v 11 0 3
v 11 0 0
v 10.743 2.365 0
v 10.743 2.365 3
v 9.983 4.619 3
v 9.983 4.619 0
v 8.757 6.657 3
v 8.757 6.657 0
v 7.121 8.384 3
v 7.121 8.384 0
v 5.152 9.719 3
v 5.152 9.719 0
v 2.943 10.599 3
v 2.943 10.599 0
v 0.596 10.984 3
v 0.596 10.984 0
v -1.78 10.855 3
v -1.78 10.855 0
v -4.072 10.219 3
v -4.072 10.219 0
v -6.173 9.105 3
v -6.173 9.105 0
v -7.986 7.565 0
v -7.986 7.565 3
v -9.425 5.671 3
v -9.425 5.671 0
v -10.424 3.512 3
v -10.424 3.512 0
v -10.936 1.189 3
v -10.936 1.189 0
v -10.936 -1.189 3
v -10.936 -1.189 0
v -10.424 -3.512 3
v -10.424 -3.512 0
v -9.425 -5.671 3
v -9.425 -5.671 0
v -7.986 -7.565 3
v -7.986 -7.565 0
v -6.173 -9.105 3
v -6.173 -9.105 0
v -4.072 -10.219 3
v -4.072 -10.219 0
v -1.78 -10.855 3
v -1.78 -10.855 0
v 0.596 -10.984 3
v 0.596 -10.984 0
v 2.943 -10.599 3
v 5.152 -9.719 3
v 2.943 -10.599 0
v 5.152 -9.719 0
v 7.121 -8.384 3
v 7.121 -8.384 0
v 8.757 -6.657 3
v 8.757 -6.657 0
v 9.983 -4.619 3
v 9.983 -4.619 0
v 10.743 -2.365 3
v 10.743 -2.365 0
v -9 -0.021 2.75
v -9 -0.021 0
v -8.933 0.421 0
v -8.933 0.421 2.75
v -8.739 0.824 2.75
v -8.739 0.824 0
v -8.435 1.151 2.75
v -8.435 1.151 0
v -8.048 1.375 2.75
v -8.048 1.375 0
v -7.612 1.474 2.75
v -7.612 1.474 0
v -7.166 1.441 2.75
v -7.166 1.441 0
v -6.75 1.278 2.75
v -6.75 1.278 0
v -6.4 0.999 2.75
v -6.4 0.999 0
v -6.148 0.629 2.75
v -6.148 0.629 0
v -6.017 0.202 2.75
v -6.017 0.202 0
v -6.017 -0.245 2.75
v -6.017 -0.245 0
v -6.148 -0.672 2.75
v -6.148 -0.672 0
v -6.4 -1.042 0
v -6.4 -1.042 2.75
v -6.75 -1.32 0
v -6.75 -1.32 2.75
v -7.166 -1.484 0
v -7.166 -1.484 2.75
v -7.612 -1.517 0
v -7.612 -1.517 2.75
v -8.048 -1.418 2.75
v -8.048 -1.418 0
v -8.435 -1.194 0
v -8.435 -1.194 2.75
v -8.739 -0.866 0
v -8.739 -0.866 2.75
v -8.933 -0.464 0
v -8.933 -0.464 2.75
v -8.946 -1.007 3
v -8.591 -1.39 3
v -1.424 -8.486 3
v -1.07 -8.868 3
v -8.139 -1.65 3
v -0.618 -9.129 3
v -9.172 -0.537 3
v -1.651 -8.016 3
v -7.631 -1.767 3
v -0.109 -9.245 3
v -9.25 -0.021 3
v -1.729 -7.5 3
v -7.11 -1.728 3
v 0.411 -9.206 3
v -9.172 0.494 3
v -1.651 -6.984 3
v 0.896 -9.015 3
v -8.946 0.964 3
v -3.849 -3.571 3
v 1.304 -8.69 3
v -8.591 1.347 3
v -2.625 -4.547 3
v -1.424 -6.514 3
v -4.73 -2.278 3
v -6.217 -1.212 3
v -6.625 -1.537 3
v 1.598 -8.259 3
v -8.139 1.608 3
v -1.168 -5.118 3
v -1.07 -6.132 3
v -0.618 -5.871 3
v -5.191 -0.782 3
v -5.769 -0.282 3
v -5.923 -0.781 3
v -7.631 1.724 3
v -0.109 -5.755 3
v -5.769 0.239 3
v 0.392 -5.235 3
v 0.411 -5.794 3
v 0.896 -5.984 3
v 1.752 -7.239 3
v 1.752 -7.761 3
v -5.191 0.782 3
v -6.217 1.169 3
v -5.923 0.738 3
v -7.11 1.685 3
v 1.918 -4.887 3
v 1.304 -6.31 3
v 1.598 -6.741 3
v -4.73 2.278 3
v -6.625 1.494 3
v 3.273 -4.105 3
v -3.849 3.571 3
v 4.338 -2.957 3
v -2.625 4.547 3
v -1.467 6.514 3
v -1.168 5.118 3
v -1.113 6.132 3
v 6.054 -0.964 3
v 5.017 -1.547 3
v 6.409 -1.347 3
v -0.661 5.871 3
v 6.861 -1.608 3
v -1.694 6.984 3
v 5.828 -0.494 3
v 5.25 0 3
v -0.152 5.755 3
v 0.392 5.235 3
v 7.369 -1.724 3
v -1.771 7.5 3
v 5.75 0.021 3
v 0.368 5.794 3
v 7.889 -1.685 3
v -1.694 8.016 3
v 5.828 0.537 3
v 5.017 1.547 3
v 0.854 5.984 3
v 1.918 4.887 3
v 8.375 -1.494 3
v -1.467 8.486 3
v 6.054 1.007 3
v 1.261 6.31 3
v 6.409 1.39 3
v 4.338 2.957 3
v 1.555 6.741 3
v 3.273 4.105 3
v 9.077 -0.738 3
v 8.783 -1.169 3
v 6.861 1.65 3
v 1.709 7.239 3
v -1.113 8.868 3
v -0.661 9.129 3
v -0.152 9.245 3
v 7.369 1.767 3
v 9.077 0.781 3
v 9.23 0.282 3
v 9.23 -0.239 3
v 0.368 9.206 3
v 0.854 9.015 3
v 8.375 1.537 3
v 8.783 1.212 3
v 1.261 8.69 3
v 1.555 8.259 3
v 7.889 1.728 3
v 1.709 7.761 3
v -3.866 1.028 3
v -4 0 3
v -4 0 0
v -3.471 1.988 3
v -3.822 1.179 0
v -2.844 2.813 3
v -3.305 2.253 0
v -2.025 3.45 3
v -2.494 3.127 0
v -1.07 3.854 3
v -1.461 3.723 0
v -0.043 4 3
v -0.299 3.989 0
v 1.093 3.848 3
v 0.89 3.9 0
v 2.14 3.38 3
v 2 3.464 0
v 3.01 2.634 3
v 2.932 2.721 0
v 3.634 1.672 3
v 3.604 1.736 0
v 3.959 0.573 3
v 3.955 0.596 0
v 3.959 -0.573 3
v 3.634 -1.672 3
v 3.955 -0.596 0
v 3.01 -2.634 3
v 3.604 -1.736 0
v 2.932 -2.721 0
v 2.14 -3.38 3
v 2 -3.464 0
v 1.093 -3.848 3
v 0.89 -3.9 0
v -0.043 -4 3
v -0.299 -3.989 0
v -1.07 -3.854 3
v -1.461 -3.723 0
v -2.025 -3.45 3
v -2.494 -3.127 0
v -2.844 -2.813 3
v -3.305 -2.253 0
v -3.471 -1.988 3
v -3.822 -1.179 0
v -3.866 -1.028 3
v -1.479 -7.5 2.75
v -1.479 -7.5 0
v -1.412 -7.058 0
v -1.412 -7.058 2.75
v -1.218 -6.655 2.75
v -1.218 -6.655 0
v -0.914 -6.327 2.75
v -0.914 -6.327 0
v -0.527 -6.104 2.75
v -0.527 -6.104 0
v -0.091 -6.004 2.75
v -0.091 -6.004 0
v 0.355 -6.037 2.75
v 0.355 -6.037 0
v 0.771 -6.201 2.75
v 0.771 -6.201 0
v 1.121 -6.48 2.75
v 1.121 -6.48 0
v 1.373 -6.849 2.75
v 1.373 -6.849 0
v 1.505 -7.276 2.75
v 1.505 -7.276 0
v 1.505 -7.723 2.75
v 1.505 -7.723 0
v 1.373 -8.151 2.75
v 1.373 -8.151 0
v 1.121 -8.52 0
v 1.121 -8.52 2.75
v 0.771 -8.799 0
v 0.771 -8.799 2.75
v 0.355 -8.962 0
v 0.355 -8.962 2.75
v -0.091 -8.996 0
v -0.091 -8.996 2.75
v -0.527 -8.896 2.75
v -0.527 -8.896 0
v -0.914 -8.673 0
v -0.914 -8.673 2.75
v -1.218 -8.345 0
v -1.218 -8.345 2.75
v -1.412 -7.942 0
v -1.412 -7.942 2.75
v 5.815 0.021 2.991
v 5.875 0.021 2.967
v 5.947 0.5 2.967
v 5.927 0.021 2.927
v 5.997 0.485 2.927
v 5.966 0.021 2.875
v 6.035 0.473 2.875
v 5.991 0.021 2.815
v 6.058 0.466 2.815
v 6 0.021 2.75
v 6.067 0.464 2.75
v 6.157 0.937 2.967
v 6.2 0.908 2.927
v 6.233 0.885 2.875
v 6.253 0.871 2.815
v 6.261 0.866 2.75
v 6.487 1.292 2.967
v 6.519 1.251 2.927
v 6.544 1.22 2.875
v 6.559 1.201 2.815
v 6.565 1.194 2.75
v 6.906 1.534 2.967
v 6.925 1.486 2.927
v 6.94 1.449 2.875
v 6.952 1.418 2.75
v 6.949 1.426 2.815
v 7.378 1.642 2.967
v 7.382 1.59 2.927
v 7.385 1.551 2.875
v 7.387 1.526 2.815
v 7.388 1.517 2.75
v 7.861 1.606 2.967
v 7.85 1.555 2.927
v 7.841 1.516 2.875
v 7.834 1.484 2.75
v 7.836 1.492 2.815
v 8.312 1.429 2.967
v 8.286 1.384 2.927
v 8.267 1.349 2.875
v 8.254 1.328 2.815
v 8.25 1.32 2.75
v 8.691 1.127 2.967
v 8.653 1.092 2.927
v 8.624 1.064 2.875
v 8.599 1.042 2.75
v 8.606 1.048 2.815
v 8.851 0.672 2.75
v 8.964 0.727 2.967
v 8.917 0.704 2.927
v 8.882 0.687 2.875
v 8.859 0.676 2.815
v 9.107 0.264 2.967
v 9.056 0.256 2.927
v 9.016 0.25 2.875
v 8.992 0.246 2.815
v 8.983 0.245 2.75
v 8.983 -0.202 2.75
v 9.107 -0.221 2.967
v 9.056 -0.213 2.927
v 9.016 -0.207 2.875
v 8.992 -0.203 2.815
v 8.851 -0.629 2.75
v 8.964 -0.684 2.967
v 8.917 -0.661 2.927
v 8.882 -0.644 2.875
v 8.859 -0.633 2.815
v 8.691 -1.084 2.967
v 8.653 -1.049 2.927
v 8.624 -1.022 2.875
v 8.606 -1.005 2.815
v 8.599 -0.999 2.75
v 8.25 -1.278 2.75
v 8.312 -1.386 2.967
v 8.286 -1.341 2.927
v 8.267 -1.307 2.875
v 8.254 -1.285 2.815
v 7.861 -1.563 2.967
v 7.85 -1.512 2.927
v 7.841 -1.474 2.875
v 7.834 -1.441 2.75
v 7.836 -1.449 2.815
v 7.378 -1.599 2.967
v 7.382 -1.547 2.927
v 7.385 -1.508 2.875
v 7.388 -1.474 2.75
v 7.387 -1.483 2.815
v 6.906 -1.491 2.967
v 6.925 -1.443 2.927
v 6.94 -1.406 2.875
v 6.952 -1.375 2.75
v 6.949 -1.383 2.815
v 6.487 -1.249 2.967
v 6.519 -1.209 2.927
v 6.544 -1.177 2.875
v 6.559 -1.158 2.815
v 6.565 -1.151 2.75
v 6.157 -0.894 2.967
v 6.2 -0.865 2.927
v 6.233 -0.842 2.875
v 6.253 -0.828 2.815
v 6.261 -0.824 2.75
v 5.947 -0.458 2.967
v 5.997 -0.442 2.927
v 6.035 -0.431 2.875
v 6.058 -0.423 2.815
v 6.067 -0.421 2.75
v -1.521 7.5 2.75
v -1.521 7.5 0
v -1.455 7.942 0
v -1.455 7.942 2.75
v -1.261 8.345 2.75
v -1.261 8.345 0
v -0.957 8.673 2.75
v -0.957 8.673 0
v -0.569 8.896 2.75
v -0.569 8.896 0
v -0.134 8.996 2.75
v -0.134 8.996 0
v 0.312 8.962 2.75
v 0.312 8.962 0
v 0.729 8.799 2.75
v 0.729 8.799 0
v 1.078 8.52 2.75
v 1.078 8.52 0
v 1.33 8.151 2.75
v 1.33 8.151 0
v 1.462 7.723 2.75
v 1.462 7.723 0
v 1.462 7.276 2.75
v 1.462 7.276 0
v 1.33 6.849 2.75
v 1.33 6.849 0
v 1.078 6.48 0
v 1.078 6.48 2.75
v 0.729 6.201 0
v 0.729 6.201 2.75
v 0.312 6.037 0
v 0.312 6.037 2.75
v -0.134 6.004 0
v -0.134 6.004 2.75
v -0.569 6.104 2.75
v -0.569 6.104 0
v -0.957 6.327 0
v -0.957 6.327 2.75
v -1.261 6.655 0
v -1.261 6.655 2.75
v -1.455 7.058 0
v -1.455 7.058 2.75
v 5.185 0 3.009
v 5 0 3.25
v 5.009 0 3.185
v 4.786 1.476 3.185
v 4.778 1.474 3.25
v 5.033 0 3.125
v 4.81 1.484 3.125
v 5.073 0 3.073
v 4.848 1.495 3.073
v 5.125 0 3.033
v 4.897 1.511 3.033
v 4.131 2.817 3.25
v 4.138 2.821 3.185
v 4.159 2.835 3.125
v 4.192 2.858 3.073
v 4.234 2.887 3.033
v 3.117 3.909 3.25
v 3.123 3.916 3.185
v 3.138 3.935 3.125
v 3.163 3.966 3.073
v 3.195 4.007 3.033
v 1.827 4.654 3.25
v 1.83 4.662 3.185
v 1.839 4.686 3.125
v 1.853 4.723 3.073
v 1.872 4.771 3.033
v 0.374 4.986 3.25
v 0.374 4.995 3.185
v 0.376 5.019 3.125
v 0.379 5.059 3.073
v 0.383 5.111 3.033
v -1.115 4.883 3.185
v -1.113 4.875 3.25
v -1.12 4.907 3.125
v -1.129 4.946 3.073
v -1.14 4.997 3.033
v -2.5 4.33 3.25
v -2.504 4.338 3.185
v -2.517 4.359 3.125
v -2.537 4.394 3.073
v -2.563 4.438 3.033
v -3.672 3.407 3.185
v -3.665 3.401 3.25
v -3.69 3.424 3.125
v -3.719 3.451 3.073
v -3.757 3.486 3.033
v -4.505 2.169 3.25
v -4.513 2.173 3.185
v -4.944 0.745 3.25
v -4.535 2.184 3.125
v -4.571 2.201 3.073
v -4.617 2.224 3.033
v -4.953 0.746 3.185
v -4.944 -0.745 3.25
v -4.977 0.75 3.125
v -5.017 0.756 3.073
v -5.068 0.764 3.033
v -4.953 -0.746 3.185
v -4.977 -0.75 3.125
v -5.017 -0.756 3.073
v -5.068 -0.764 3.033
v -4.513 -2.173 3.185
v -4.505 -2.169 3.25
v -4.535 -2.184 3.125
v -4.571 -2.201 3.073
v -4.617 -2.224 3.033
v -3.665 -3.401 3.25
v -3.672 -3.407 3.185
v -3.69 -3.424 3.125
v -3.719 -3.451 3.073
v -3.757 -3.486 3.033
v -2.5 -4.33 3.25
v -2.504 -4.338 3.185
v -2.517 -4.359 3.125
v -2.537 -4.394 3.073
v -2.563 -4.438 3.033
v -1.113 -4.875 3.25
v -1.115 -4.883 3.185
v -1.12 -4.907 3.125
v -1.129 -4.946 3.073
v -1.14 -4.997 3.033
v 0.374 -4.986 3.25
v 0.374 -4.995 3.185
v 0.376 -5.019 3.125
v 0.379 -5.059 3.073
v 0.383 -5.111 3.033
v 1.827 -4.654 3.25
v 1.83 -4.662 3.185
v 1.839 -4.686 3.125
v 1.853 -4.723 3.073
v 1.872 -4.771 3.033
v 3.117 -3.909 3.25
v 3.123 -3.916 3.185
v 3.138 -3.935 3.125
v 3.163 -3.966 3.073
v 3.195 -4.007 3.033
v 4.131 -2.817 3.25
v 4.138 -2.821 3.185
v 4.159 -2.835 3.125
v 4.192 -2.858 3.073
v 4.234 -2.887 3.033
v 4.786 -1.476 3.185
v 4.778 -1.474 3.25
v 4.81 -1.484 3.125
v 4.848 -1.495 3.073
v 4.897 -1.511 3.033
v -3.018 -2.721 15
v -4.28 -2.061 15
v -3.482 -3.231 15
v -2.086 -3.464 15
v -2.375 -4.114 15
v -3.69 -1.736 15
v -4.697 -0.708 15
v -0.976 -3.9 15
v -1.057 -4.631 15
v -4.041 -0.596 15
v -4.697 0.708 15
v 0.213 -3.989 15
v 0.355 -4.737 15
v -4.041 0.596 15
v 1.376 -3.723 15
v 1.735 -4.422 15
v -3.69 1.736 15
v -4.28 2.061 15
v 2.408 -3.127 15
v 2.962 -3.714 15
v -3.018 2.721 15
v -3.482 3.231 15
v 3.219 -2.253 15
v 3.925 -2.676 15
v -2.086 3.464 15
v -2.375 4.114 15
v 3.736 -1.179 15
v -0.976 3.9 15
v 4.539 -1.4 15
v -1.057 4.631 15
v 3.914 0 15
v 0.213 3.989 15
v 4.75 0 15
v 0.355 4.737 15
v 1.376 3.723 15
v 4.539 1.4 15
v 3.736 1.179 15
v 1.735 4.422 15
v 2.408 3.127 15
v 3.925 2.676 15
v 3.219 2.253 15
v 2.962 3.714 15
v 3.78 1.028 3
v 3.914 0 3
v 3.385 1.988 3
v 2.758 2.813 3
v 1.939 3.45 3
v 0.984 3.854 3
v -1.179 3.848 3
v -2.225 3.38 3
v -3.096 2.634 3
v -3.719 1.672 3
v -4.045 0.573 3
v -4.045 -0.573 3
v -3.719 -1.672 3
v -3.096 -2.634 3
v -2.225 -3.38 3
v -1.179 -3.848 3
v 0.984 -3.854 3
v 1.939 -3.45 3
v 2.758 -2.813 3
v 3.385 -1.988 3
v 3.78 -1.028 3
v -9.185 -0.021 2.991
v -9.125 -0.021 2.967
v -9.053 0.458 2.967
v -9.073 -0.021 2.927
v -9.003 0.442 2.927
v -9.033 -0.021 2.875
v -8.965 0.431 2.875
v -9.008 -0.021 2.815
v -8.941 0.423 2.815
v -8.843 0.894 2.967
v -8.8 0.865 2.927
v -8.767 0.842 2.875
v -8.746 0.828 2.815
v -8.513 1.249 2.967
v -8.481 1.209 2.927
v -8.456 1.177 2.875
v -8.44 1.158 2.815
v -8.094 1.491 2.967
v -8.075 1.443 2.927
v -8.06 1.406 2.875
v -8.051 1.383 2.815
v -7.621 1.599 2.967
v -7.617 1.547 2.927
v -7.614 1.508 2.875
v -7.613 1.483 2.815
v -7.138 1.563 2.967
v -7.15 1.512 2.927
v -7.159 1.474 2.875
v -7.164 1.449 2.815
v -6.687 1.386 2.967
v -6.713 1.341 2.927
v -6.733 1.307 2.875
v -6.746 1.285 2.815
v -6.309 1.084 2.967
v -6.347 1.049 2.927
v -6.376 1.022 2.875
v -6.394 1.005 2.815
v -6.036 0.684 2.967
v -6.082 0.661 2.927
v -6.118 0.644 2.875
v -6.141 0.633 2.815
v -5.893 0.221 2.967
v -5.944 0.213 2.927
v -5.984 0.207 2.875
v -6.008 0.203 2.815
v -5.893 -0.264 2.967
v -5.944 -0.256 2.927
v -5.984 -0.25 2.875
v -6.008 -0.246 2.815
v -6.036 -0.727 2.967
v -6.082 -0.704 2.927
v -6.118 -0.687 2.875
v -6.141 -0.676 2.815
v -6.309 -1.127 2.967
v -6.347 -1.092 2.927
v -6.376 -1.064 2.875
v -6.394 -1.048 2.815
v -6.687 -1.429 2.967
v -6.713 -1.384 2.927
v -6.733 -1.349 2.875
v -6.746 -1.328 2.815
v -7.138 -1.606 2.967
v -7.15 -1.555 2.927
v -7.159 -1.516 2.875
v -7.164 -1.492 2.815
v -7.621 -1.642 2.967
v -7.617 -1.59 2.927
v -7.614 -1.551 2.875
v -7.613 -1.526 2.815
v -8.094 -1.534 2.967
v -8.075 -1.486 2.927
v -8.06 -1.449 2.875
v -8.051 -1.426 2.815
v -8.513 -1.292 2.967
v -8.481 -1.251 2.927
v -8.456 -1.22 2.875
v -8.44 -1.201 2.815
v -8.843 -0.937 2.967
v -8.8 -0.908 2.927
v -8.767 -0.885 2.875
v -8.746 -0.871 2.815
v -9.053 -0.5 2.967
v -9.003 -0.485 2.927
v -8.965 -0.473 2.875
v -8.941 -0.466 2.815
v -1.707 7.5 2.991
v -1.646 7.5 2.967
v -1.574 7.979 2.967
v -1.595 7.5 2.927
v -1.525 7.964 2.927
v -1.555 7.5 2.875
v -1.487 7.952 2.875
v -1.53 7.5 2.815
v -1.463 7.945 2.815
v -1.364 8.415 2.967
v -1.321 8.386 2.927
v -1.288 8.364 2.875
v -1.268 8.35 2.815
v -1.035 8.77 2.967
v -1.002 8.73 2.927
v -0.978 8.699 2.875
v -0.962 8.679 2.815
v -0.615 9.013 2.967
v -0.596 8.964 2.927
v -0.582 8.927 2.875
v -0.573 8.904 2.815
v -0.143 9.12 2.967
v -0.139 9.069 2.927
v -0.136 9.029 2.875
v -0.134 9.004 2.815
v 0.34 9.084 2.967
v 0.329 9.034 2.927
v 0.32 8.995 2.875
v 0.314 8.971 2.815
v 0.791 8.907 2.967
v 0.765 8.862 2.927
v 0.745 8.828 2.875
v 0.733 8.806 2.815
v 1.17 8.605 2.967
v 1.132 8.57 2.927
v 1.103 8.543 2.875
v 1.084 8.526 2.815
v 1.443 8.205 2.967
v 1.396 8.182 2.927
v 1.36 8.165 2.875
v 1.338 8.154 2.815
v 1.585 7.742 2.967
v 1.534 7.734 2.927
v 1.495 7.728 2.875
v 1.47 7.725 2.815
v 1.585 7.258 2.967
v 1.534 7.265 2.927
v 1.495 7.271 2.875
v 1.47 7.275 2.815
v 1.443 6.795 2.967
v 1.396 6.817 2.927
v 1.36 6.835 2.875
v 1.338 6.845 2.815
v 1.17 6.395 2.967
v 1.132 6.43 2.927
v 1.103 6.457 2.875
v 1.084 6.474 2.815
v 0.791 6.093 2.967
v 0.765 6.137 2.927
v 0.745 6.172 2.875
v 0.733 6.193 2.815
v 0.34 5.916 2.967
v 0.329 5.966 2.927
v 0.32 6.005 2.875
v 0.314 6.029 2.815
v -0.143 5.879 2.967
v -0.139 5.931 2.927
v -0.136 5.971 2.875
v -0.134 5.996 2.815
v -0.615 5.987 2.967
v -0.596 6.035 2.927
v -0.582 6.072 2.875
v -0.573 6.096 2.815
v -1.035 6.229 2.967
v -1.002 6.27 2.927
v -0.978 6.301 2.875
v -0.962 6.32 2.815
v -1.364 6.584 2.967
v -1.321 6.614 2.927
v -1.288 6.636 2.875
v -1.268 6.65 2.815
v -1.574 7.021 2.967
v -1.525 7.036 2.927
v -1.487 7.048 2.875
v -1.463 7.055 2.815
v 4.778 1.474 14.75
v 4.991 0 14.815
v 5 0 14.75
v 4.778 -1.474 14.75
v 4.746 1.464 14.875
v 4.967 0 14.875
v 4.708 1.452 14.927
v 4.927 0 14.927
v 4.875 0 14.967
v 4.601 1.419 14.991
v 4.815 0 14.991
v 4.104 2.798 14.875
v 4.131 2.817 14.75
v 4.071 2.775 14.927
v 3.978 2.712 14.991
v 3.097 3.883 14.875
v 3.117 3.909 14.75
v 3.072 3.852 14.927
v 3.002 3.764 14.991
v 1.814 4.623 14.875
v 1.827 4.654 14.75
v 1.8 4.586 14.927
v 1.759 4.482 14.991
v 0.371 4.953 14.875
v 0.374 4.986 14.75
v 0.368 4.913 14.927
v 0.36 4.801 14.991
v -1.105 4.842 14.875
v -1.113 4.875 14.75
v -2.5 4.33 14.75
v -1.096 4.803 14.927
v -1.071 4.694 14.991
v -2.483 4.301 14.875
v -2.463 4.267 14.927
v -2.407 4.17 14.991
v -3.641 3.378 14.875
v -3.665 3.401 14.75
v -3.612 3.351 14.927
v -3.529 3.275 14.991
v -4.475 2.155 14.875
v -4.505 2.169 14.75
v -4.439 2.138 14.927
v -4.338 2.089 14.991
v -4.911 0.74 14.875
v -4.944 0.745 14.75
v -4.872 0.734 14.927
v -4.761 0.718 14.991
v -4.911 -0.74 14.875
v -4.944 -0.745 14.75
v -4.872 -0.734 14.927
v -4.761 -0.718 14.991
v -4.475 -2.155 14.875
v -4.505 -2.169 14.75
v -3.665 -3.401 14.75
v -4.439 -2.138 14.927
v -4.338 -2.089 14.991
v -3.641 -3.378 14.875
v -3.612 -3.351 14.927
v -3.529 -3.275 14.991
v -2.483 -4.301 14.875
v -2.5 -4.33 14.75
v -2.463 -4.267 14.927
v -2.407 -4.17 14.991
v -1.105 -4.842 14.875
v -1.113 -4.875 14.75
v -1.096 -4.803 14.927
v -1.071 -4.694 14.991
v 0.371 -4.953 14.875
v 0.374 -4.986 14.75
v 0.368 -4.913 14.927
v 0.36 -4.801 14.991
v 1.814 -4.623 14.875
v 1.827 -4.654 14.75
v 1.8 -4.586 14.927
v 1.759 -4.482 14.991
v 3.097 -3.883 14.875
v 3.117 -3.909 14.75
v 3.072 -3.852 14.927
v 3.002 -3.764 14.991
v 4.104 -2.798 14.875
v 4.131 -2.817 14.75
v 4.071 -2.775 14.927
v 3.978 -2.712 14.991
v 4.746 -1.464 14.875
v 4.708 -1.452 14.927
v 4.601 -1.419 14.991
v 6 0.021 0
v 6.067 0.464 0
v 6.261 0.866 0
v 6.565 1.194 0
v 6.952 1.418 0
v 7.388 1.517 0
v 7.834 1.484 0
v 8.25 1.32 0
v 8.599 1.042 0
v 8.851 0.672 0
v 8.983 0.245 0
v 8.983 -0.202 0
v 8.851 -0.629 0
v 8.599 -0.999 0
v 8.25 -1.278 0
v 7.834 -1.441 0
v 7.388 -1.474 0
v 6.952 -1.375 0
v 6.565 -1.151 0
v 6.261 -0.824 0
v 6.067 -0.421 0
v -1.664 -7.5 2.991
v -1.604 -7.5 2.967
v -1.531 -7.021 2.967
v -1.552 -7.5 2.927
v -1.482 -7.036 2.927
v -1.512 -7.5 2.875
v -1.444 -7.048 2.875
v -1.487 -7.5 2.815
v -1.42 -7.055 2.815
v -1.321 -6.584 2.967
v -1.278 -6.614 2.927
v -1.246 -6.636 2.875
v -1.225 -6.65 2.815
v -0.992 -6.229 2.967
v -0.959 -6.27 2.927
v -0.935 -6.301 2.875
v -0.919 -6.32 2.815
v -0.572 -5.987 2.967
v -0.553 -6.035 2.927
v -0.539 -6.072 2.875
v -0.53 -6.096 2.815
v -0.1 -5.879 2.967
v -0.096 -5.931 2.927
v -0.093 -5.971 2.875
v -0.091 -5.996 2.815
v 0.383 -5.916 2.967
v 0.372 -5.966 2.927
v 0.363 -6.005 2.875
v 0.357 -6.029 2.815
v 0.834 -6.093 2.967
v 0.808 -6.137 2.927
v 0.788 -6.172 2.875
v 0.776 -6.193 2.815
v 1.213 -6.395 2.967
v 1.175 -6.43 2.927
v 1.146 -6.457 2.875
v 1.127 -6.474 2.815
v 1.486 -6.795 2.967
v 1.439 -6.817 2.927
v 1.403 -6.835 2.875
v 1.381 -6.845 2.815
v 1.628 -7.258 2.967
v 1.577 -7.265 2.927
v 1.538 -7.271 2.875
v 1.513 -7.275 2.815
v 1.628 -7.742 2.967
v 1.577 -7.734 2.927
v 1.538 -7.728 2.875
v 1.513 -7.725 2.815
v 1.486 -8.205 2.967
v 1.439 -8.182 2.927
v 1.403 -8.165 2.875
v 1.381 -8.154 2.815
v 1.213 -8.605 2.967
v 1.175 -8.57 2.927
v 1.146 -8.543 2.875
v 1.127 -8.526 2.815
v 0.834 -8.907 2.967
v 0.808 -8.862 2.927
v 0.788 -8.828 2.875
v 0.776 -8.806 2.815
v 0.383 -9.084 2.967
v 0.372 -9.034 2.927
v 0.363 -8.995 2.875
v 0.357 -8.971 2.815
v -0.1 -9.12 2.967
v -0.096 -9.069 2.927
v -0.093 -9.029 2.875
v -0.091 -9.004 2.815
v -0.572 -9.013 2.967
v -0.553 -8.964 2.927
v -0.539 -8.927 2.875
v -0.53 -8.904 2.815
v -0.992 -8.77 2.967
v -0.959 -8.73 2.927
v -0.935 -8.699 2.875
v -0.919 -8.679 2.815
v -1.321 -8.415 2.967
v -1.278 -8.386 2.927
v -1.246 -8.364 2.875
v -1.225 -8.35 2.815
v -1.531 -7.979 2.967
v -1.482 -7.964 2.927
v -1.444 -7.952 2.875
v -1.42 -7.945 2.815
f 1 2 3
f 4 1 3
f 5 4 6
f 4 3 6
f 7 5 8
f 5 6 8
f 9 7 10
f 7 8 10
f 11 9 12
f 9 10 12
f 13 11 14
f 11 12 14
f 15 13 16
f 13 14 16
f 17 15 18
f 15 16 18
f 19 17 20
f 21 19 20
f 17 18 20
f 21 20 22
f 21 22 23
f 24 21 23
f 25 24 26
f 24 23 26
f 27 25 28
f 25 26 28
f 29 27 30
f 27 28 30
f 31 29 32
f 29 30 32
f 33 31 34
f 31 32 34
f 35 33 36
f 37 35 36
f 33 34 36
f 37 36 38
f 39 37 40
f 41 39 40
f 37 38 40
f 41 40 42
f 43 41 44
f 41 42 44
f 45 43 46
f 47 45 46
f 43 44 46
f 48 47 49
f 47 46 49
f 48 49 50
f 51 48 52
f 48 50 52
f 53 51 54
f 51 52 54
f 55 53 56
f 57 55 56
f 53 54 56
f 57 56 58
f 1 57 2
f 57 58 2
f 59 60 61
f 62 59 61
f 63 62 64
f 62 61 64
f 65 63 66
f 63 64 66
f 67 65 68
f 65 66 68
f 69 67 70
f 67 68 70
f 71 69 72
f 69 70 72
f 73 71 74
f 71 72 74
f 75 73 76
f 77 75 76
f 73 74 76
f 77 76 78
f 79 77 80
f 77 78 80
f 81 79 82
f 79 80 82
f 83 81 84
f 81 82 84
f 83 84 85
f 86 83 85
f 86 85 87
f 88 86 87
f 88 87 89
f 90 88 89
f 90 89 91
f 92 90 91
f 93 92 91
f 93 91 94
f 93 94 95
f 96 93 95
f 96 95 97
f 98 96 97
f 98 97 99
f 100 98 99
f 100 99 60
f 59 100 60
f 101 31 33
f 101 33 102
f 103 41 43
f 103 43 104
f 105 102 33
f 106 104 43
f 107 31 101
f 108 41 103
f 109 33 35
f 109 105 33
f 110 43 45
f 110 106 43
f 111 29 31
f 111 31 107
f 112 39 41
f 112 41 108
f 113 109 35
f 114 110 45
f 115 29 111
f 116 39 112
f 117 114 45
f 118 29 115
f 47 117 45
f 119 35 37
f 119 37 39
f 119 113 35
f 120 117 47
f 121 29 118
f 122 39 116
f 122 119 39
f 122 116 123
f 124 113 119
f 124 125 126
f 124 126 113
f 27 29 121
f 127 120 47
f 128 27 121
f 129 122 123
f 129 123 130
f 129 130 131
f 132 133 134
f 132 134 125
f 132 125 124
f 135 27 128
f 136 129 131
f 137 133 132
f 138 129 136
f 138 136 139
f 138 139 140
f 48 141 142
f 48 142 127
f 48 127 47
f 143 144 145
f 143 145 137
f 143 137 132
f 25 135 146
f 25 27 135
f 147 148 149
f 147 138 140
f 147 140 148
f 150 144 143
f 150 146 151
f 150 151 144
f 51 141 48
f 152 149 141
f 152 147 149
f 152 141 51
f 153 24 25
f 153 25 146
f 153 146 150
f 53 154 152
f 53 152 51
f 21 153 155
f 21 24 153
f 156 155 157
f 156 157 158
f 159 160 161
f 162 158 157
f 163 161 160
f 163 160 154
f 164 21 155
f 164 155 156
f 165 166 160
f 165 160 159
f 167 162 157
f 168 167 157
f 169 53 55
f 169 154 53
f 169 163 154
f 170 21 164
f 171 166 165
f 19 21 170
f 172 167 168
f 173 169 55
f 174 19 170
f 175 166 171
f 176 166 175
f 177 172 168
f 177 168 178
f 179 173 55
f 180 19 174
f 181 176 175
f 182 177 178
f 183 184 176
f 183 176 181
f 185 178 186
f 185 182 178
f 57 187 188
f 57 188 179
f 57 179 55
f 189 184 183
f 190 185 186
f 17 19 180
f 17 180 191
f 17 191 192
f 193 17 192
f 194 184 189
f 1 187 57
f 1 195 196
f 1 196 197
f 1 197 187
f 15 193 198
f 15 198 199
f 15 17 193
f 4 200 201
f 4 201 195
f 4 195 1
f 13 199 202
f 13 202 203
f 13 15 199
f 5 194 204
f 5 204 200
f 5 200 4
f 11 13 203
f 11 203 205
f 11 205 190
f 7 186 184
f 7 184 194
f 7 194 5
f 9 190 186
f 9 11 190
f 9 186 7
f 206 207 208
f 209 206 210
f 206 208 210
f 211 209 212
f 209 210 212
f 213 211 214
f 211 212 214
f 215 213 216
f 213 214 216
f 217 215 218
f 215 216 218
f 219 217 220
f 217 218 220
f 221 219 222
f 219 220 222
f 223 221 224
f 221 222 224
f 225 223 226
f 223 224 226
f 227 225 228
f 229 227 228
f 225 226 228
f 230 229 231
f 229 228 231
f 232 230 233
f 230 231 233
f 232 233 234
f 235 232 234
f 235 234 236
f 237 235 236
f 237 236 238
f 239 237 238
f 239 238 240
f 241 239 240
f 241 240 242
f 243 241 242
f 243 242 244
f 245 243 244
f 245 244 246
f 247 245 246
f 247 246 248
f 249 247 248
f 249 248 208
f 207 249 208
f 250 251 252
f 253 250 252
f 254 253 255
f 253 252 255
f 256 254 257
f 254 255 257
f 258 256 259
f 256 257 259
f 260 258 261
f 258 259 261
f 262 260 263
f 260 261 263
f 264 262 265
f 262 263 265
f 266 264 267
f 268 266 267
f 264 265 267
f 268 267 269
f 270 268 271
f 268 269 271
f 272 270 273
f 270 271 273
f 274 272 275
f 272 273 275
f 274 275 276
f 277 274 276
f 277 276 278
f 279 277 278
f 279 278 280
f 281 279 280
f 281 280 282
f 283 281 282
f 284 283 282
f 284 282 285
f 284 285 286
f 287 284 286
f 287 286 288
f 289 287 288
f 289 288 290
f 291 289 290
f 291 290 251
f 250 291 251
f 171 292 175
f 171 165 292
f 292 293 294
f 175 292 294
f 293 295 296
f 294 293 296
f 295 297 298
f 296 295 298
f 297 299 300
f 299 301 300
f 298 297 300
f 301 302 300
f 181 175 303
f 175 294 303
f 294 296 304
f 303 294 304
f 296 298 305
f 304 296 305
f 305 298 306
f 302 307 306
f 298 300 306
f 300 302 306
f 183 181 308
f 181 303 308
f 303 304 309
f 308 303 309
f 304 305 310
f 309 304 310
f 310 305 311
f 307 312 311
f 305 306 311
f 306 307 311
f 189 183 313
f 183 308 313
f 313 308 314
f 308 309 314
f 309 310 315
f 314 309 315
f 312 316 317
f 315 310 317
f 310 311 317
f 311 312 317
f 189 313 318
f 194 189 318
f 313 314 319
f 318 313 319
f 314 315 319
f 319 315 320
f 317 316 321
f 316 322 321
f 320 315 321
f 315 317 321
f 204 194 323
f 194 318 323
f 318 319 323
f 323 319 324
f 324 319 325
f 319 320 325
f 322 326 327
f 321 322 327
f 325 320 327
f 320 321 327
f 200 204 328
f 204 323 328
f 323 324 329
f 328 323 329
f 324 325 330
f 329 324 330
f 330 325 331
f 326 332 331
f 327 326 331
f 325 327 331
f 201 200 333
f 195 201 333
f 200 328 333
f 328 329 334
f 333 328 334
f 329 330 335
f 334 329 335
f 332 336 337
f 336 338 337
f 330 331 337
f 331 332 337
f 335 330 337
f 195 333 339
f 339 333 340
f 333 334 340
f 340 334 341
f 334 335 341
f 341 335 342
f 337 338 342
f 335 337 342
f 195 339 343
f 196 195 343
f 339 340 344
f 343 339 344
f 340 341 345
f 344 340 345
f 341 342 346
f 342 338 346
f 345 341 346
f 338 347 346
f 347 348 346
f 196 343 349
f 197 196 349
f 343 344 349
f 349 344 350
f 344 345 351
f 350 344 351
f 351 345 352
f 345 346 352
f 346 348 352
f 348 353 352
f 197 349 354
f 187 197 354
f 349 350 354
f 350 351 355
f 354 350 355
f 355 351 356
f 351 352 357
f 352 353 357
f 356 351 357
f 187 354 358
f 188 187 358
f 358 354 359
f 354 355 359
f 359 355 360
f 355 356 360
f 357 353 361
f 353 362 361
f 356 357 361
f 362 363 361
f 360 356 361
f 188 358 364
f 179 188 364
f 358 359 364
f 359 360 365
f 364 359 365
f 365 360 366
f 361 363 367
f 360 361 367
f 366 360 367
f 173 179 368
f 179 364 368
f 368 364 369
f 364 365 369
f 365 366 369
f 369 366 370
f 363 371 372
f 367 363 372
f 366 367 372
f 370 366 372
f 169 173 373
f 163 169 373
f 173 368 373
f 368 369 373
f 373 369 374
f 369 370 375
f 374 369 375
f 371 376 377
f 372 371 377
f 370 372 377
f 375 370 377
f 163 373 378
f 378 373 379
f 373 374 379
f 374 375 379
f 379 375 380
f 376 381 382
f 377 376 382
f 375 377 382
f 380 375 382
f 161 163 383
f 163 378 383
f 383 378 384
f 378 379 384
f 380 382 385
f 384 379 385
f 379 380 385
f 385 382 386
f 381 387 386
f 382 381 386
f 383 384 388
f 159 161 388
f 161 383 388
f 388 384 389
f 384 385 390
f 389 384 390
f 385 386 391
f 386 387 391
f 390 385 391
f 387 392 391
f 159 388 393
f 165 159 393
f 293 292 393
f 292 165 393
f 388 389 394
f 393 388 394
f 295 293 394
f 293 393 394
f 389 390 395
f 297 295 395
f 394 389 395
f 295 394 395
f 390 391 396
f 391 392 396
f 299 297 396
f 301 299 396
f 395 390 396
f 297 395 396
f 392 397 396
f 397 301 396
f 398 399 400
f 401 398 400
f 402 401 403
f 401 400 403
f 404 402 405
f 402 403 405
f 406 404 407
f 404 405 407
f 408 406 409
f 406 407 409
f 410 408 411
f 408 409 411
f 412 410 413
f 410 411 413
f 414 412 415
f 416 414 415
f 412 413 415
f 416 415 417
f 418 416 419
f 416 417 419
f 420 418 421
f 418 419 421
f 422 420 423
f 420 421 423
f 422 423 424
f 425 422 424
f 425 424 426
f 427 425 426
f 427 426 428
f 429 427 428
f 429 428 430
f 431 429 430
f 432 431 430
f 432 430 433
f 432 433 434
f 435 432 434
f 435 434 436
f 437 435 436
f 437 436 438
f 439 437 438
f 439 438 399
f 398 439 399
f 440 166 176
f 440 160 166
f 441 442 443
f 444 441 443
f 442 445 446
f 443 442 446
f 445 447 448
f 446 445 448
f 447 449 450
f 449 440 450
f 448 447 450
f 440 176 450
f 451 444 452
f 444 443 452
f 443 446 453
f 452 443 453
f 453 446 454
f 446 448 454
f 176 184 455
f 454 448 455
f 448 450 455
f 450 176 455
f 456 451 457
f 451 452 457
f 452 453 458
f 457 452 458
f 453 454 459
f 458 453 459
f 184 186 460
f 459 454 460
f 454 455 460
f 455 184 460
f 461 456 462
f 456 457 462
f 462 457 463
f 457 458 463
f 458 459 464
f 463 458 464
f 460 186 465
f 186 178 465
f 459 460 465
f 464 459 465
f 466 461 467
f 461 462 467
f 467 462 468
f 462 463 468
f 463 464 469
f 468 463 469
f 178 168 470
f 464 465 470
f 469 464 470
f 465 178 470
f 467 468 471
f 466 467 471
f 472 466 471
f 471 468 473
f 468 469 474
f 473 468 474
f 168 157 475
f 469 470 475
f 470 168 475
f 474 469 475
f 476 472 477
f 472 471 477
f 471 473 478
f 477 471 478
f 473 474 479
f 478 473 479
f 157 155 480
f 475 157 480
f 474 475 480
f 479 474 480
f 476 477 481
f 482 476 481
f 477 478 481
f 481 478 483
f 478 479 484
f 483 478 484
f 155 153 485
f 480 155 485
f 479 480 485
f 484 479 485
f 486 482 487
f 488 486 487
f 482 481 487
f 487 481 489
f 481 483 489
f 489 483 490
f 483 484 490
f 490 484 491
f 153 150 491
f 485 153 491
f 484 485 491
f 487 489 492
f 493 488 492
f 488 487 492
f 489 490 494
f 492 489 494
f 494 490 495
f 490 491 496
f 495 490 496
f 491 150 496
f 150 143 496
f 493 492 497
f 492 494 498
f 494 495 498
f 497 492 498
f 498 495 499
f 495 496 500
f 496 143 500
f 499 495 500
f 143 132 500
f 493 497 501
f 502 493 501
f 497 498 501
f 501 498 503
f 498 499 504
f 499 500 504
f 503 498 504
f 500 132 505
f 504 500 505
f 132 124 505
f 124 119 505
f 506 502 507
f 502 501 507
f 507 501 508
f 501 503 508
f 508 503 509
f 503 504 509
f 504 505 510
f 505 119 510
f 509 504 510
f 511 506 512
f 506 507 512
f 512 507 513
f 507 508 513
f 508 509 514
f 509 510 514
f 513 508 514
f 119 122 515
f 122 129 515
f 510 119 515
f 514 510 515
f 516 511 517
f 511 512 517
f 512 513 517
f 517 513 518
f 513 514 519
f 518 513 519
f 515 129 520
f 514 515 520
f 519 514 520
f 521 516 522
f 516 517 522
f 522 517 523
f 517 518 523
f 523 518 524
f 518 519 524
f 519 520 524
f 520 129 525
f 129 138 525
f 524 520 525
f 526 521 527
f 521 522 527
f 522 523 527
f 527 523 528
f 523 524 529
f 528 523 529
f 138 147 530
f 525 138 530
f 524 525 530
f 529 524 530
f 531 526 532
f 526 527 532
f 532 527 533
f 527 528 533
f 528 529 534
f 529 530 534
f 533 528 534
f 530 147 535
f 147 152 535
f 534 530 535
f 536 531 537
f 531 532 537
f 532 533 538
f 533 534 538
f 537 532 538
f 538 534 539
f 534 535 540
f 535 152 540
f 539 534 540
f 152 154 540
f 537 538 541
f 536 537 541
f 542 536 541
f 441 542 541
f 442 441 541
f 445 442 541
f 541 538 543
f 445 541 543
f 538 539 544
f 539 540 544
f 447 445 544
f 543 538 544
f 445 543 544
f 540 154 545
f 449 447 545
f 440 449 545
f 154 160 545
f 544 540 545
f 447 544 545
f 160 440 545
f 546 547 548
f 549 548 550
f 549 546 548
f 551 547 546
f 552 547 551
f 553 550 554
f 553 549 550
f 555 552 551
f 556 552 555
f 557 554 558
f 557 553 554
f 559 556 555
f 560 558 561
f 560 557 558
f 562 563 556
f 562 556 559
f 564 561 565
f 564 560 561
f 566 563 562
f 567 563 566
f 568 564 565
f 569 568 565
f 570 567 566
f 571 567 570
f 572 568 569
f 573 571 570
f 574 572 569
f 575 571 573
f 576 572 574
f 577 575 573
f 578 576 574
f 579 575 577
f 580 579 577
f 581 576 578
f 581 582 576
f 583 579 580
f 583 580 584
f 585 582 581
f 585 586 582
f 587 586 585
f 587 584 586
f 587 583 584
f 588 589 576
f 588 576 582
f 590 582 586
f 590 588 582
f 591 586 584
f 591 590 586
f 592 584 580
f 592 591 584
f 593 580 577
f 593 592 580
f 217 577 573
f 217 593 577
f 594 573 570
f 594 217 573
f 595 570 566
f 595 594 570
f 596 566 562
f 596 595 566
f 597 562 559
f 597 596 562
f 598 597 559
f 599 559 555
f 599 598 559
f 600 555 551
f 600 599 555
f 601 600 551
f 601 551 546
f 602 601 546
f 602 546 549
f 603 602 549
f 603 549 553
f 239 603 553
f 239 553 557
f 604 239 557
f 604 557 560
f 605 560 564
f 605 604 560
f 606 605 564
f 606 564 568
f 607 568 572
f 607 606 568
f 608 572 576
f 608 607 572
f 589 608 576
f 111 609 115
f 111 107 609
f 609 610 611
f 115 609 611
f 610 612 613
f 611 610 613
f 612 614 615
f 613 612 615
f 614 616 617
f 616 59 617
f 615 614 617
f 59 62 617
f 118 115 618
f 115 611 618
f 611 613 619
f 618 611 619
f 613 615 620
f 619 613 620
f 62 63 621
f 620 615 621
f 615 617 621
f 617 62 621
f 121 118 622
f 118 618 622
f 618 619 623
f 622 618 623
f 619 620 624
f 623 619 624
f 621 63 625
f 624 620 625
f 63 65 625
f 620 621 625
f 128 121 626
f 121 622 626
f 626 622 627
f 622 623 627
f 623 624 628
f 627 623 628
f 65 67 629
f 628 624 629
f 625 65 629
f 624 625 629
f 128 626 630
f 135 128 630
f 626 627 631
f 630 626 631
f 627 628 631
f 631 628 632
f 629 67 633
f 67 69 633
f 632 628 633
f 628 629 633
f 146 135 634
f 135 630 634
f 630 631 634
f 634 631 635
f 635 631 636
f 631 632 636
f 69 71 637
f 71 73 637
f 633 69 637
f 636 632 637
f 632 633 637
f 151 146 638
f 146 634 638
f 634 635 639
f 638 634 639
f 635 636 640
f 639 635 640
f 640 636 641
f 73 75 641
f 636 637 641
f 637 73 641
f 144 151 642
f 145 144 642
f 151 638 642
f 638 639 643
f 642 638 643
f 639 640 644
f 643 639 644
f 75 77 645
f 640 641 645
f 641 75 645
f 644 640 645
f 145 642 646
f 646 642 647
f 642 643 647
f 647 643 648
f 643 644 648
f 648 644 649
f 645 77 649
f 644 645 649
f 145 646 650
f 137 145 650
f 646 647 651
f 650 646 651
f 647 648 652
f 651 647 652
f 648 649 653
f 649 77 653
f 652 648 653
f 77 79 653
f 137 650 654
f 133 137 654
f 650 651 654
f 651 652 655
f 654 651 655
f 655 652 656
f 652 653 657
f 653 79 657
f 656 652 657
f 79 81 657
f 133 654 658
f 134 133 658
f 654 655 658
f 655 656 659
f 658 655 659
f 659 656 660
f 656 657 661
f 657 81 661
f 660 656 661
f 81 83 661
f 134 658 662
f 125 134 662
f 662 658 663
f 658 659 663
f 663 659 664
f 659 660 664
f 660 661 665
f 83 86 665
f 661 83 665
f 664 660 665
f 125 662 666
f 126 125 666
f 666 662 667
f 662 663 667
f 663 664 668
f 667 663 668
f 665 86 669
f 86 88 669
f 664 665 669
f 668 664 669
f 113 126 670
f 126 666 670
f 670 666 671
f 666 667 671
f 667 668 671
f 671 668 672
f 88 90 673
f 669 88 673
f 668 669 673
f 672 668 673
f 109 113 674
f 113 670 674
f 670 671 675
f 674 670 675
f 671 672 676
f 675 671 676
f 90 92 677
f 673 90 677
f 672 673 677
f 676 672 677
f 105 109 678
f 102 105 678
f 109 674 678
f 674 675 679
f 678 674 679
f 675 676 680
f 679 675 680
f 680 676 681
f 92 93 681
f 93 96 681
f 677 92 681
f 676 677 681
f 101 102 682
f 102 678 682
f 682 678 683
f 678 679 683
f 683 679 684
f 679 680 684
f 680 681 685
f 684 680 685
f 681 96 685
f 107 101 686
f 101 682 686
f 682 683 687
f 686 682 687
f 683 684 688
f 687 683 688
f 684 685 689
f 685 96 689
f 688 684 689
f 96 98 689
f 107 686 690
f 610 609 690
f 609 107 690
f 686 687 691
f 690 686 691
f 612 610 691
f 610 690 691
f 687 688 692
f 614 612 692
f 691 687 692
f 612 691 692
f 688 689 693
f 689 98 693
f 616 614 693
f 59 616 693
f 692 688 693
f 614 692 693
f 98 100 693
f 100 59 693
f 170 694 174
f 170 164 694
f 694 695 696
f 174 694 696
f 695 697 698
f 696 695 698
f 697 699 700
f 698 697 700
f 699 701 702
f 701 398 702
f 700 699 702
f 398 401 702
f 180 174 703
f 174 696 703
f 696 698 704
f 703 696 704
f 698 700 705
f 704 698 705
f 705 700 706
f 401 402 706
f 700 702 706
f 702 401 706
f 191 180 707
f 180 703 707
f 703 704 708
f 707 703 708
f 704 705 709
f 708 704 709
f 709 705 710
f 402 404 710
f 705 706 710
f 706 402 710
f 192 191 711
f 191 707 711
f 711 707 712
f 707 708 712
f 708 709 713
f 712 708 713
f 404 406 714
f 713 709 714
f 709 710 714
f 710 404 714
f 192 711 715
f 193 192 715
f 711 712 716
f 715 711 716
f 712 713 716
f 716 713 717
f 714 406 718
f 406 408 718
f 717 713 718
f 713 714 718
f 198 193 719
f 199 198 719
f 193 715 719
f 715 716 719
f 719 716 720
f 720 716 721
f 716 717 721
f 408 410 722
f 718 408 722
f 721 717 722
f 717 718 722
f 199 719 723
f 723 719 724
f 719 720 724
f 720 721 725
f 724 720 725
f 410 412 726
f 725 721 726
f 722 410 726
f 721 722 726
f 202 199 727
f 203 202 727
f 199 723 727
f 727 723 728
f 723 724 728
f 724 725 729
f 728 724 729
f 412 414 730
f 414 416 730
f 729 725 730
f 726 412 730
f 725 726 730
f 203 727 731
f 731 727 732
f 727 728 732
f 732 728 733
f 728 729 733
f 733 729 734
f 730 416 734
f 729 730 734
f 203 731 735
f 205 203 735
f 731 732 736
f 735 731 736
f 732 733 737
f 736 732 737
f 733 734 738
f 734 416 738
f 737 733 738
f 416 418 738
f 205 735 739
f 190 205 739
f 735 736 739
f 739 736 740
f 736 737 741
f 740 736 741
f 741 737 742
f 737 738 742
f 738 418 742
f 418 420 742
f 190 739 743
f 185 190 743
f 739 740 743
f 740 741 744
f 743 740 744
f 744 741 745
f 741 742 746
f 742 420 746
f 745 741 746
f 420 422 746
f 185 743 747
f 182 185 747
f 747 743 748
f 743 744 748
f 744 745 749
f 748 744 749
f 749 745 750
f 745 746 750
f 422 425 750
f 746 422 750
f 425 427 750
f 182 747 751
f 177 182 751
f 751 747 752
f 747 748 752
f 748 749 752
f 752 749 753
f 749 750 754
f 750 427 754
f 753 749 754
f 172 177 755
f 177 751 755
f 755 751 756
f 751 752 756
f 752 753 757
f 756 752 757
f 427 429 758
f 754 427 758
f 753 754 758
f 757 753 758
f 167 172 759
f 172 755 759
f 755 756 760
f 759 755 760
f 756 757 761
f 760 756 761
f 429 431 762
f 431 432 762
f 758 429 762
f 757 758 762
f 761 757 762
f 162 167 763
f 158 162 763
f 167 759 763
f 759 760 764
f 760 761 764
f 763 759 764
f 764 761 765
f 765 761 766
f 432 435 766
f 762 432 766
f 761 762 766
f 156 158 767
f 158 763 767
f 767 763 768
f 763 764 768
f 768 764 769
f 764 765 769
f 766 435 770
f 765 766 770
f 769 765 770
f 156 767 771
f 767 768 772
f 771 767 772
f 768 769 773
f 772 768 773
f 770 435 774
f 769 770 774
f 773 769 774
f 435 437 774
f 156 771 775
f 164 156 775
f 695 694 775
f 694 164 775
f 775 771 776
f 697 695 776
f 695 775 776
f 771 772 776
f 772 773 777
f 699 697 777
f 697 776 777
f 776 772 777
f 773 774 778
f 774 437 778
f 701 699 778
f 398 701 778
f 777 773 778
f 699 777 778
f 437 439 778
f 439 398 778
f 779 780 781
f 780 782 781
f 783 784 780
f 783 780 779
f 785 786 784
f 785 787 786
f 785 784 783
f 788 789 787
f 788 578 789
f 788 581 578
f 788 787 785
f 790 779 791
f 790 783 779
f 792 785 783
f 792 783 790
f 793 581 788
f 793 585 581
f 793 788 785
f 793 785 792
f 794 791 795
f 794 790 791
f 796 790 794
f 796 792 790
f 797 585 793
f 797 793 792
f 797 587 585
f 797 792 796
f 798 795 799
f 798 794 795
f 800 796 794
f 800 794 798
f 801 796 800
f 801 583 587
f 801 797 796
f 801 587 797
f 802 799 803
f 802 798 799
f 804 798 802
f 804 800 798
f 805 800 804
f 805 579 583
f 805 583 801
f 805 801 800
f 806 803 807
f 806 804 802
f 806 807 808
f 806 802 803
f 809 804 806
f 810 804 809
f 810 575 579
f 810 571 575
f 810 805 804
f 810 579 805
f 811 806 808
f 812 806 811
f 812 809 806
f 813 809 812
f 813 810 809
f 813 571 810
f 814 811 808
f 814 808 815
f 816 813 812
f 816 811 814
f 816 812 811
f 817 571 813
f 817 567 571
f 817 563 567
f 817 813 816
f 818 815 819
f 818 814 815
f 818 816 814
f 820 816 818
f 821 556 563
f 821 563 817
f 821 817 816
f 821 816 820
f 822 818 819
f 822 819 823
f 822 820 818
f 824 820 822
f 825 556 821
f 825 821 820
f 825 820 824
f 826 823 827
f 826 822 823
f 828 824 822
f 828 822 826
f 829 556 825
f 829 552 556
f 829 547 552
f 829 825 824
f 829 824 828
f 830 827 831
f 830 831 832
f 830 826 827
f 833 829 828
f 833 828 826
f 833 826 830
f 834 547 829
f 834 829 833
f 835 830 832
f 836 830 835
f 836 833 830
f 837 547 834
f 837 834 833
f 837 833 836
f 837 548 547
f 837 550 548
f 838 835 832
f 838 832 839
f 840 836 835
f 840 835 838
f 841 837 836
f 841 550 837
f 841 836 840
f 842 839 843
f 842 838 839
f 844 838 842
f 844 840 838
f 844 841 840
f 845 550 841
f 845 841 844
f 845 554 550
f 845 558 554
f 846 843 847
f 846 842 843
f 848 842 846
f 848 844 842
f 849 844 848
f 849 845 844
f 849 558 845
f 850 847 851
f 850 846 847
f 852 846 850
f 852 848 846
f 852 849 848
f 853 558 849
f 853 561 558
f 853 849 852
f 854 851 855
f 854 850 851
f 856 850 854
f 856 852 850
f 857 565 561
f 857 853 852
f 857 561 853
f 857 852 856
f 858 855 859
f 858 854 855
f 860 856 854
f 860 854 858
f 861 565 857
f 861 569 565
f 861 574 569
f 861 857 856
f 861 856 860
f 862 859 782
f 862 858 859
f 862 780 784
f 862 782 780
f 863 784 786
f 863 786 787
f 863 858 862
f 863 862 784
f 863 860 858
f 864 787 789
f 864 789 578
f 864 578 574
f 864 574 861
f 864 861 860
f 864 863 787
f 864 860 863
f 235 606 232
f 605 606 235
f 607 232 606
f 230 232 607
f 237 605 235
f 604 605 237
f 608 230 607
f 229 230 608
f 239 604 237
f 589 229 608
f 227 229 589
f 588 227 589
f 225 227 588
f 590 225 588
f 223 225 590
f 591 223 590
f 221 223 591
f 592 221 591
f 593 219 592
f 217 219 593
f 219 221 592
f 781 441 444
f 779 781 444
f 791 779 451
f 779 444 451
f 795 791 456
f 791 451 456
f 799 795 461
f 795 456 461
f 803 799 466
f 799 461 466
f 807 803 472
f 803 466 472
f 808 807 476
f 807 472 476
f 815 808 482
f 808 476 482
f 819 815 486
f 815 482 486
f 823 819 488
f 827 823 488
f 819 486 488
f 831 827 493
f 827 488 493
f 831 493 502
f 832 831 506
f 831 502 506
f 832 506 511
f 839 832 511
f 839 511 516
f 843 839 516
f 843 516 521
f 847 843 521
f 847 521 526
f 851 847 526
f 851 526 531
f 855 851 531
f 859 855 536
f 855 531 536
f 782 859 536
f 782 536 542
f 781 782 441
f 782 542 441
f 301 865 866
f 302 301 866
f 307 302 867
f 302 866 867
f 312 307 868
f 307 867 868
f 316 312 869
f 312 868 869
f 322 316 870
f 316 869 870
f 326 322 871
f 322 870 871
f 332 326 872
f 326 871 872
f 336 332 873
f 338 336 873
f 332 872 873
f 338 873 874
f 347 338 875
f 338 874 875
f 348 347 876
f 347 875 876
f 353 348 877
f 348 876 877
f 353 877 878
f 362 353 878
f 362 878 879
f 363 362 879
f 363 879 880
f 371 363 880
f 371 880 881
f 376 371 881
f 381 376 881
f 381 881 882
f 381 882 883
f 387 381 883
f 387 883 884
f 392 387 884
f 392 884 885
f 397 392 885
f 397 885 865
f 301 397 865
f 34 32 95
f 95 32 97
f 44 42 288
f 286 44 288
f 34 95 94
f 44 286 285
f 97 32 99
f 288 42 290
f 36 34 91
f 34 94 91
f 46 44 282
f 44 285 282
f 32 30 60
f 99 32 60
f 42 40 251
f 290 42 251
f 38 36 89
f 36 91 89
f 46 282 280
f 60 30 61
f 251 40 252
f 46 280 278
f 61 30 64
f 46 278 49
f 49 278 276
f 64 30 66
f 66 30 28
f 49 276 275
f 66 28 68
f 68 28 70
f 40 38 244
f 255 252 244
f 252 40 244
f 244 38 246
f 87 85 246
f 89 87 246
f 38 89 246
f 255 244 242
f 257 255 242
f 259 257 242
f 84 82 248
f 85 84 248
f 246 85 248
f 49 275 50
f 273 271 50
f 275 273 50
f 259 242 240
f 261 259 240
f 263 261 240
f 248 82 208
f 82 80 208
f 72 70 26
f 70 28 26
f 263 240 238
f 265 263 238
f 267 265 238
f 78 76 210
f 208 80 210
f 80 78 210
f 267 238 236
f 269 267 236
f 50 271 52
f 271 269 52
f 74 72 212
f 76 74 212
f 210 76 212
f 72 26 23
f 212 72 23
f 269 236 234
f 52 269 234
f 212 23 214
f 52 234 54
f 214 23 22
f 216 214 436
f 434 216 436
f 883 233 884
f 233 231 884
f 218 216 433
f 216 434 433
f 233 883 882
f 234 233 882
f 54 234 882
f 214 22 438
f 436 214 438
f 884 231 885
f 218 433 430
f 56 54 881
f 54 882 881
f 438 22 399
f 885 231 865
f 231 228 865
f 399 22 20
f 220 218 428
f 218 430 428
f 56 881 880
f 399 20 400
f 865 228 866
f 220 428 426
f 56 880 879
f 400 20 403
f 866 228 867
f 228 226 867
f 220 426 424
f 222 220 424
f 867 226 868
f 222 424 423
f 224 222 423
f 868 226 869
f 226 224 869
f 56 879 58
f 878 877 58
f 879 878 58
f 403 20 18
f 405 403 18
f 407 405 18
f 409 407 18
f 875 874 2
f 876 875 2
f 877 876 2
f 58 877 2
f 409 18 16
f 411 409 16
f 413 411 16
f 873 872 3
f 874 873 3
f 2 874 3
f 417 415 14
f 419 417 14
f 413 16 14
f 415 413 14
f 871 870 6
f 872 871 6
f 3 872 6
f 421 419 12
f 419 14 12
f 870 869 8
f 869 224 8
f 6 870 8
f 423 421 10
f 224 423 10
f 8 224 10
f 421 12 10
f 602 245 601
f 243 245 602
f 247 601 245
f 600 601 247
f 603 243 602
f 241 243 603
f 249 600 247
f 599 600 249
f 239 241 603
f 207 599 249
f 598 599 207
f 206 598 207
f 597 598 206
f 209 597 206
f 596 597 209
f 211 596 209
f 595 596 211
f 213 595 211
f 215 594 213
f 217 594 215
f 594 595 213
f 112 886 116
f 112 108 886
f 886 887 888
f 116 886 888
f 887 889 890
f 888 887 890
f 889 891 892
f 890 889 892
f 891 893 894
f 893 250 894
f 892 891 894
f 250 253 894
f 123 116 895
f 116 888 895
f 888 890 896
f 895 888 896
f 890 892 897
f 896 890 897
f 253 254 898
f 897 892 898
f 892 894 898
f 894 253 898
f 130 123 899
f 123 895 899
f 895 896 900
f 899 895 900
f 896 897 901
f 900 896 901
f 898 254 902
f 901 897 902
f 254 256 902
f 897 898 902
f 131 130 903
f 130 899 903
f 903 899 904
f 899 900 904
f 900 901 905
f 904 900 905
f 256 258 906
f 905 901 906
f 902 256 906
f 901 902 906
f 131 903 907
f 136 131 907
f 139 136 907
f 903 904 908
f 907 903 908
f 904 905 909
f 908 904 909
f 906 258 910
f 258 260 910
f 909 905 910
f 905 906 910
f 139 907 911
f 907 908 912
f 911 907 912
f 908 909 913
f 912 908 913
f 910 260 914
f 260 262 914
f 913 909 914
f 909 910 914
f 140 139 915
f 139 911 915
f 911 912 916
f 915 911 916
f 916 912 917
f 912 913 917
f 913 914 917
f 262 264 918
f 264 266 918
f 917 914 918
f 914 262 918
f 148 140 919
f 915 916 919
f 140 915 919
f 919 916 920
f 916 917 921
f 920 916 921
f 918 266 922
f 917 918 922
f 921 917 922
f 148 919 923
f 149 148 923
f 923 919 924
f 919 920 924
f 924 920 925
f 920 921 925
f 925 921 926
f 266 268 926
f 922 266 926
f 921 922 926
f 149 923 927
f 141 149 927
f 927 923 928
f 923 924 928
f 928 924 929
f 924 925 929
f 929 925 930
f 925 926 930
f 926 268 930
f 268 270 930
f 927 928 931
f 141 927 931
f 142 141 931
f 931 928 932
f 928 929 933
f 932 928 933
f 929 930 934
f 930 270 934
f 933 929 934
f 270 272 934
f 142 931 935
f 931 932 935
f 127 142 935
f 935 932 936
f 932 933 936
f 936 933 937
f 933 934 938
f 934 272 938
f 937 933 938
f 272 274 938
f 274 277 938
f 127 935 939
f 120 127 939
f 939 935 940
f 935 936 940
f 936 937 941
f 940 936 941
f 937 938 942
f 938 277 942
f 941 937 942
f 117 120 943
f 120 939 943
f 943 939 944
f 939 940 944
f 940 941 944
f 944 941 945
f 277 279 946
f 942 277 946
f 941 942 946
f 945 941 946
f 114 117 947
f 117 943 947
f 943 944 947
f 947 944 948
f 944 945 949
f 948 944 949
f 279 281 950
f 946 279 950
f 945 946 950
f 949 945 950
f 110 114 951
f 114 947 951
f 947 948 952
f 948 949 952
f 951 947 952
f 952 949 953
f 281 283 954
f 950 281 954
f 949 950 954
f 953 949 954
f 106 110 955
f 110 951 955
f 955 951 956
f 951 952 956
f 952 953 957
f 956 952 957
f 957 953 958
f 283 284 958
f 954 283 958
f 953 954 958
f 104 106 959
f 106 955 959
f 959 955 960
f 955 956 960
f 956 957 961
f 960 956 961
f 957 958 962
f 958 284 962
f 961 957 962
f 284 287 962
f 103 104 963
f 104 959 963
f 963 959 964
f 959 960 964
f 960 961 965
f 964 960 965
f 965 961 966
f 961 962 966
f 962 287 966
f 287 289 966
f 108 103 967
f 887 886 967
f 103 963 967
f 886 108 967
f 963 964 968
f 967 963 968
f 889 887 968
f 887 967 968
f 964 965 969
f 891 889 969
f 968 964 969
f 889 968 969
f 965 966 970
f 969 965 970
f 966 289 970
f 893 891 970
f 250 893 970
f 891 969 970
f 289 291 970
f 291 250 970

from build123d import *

# Parameters (mm, degrees)
ESQUISSE1_R             = 11
BOSS_EXTRU_1_DEPTH      = 3
ESQUISSE2_R             = 5
ESQUISSE2_R_2           = 4
BOSS_EXTRU_2_DEPTH      = 12
ESQUISSE3_R             = 4
ENL_V_MAT_EXTRU_1_DEPTH = 3
ESQUISSE4_R             = 1.5
ENL_V_MAT_EXTRU_2_DEPTH = 12
CONG_1_R                = 0.25
CONG_2_R                = 0.25
CONG_3_R                = 0.25


with BuildPart() as part:
    # Esquisse1 → Boss.-Extru.1 (new body)
    with BuildSketch(Plane.XY):
        Circle(ESQUISSE1_R)
    extrude(amount=BOSS_EXTRU_1_DEPTH)

    # Esquisse2 → Boss.-Extru.2 (add)
    with BuildSketch(Plane.XY.offset(3)):
        Circle(ESQUISSE2_R)
        with Locations((-0.085794689, 0)):
            Circle(ESQUISSE2_R_2, mode=Mode.SUBTRACT)
    extrude(amount=BOSS_EXTRU_2_DEPTH)

    # Esquisse3 → Enlèv. mat.-Extru.1 (cut)
    with BuildSketch(Plane(origin=(0, 0, 0), x_dir=(-1, 0, 0), z_dir=(0, 0, -1))):
        Circle(ESQUISSE3_R)
    extrude(amount=-ENL_V_MAT_EXTRU_1_DEPTH, mode=Mode.SUBTRACT)

    # Esquisse4 → Enlèv. mat.-Extru.2 (cut)
    with BuildSketch(Plane(origin=(0, 0, 0), x_dir=(-1, 0, 0), z_dir=(0, 0, -1))):
        with Locations((0.021448672, 7.499884985)):
            Circle(ESQUISSE4_R)
        with Locations((7.499884985, -0.021448672)):
            Circle(ESQUISSE4_R)
        with Locations((-0.021448672, -7.499884985)):
            Circle(ESQUISSE4_R)
        with Locations((-7.499884985, 0.021448672)):
            Circle(ESQUISSE4_R)
    extrude(amount=-ENL_V_MAT_EXTRU_2_DEPTH, mode=Mode.SUBTRACT)

    # Congé1
    cong_1_edges = [part.edges().sort_by_distance(p)[0] for p in [
        (1.478551328, 7.499884985, 3),
        (-5.999884985, -0.021448672, 3),
        (1.521448672, -7.499884985, 3),
        (8.999884985, 0.021448672, 3),
    ]]
    fillet(cong_1_edges, radius=CONG_1_R)

    # Congé2
    cong_2_edges = [part.edges().sort_by_distance(p)[0] for p in [
        (-5, 0, 15),
    ]]
    fillet(cong_2_edges, radius=CONG_2_R)

    # Congé3
    cong_3_edges = [part.edges().sort_by_distance(p)[0] for p in [
        (-5, 0, 3),
    ]]
    fillet(cong_3_edges, radius=CONG_3_R)


solid = part.part
